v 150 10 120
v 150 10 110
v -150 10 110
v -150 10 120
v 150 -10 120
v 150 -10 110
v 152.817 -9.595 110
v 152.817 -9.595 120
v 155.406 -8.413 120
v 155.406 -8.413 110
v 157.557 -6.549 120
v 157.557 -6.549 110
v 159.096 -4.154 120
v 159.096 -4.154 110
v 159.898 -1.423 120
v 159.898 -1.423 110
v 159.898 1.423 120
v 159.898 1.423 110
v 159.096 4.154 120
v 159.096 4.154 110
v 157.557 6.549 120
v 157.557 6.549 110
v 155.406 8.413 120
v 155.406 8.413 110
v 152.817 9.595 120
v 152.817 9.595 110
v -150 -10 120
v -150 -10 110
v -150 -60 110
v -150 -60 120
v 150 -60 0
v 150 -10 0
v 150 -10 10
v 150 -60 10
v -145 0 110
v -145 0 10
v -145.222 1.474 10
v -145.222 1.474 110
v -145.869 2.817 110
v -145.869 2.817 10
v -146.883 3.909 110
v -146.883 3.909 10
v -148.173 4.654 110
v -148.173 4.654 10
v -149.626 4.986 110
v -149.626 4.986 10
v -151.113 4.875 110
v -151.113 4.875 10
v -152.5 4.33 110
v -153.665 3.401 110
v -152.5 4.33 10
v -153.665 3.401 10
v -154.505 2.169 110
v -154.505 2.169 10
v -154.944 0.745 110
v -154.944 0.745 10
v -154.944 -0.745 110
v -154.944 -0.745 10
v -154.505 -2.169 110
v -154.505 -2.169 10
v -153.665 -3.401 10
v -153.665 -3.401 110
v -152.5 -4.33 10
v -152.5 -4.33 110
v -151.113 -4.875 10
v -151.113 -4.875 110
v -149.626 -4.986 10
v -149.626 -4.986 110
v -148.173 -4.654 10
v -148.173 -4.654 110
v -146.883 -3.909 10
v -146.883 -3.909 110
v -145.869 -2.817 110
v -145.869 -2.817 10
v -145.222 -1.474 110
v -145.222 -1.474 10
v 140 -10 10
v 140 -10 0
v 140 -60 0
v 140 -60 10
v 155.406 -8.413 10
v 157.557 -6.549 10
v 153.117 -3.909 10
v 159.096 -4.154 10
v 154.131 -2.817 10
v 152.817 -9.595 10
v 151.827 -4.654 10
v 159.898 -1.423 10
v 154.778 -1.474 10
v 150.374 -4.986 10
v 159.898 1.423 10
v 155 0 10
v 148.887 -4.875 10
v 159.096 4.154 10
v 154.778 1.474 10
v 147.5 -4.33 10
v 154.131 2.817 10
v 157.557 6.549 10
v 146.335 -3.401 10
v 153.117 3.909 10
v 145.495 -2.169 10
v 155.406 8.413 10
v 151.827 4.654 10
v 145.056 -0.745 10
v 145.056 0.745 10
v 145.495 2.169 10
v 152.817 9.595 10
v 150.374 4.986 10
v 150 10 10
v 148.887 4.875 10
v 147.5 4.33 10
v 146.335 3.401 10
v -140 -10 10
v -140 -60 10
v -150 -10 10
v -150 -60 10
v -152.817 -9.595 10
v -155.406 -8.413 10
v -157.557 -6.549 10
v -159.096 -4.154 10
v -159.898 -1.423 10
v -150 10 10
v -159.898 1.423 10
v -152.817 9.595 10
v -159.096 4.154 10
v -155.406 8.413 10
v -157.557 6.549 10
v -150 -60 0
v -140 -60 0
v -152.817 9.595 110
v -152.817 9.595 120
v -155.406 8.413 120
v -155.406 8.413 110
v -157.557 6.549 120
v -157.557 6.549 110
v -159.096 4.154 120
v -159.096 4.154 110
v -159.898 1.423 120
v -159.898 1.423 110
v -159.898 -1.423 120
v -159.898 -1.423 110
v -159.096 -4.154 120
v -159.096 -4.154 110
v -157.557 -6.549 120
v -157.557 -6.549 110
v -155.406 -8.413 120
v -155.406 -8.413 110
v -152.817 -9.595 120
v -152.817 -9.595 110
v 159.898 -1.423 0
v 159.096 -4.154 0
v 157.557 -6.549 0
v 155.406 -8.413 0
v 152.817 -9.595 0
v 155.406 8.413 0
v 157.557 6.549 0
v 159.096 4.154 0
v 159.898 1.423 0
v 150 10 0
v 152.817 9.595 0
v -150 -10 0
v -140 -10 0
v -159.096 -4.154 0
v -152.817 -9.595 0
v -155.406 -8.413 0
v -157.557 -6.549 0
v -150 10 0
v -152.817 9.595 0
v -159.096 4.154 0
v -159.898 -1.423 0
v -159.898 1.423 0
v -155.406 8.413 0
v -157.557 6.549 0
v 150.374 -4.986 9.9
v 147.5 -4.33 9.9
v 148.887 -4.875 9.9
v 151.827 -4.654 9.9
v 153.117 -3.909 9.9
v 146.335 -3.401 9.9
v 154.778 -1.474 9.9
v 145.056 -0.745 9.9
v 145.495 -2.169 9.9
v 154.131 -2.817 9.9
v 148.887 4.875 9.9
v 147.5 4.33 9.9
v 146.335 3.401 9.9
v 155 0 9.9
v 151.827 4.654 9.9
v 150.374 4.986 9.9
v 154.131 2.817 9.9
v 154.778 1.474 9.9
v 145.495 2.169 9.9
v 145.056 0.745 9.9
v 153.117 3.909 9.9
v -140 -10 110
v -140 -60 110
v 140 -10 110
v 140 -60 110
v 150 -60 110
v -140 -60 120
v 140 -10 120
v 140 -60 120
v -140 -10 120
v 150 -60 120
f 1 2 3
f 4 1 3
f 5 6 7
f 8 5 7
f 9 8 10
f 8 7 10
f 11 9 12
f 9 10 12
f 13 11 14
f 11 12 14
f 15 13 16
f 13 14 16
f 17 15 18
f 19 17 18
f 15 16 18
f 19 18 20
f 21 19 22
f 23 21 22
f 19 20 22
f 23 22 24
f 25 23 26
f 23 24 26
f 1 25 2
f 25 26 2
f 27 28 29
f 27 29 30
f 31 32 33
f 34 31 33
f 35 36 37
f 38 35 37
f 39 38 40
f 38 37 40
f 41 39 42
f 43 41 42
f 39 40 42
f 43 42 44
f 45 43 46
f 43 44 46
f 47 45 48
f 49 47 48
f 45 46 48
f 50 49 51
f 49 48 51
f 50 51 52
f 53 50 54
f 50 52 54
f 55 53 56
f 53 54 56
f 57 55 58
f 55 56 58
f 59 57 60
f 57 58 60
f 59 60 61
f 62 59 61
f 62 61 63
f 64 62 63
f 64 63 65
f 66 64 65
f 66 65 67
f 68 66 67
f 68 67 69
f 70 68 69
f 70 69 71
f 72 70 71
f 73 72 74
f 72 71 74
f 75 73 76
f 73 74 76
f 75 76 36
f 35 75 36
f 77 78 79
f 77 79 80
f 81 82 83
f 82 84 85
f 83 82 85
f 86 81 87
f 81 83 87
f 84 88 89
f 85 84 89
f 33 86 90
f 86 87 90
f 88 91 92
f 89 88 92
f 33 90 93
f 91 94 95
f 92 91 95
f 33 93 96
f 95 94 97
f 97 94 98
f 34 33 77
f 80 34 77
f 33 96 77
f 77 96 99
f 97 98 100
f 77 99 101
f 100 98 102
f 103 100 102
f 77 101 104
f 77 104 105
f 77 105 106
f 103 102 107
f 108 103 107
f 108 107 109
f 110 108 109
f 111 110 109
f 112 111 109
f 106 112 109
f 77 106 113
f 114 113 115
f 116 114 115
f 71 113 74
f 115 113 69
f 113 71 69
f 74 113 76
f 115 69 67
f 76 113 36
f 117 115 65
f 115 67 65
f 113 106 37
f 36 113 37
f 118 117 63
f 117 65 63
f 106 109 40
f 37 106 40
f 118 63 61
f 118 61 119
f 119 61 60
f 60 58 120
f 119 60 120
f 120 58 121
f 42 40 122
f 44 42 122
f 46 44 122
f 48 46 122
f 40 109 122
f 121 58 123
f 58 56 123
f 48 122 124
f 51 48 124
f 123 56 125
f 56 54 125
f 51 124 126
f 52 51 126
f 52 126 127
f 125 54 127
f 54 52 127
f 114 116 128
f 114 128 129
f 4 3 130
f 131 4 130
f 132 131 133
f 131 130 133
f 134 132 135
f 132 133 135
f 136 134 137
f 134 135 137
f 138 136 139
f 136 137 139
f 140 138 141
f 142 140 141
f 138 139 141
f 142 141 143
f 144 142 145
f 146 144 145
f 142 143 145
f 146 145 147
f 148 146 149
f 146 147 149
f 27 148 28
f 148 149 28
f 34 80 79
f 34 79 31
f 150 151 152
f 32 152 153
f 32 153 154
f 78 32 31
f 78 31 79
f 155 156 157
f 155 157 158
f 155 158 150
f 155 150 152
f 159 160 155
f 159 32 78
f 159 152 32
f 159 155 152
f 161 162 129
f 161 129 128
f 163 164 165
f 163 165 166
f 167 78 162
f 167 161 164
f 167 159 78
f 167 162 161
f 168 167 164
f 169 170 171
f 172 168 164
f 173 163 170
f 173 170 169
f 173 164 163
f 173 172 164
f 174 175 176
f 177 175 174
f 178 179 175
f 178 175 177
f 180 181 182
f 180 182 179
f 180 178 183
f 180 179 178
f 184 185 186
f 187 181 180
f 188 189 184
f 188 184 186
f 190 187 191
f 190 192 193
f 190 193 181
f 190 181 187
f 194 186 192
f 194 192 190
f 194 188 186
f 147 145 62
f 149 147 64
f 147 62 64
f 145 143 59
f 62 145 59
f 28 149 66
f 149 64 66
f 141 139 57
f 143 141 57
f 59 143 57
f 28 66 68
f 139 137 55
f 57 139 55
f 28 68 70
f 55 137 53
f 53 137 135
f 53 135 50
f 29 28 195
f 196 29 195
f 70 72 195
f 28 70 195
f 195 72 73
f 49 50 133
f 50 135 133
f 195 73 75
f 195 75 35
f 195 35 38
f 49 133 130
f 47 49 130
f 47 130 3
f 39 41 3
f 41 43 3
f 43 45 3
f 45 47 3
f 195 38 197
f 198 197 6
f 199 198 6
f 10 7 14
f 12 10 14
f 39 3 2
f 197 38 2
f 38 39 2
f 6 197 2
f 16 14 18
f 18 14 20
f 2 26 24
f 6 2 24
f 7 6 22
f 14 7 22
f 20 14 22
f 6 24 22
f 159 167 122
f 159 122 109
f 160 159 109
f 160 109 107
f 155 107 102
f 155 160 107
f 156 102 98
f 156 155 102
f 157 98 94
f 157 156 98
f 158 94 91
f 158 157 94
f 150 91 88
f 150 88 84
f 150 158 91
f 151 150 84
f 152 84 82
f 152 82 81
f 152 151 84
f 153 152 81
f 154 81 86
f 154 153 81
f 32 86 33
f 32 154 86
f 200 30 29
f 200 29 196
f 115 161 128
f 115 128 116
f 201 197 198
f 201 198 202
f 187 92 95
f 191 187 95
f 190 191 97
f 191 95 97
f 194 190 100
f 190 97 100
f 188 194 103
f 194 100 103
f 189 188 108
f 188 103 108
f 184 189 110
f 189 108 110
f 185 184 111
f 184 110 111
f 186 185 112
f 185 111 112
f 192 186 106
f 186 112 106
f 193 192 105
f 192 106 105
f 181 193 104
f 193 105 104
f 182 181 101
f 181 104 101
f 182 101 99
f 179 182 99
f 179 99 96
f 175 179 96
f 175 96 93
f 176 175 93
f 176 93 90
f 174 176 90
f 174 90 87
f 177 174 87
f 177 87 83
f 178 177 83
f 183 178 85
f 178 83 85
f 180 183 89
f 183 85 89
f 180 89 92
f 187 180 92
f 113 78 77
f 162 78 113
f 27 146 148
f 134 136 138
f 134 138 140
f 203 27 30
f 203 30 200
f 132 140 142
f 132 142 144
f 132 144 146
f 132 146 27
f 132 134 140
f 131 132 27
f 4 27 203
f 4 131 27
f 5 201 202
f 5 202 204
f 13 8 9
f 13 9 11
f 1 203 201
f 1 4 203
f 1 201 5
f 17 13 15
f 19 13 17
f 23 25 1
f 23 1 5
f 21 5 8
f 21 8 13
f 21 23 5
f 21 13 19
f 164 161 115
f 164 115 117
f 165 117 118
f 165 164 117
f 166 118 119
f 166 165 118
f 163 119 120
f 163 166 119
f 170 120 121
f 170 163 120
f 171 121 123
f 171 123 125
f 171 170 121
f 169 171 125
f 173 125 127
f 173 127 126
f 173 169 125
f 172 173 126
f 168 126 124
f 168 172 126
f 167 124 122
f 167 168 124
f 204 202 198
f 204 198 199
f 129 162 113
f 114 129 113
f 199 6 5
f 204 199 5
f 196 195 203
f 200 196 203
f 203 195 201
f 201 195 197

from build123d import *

# Parameters (mm, degrees)
SALIENTE_EXTRUIR1_DEPTH = 10
CROQUIS2_R              = 5
SALIENTE_EXTRUIR2_DEPTH = 100
SALIENTE_EXTRUIR3_DEPTH = 10
CROQUIS4_W              = 10
CROQUIS4_H              = 10
SALIENTE_EXTRUIR4_DEPTH = 50
CROQUIS5_R              = 5
CORTAR_EXTRUIR1_DEPTH   = 0.1


with BuildPart() as part:
    # Croquis1 → Saliente-Extruir1 (new body)
    with BuildSketch(Plane.XY):
        with BuildLine():
            Line((-150, 10), (150, 10))
            ThreePointArc((150, 10), (160, 0), (150, -10))
            Line((150, -10), (-150, -10))
            ThreePointArc((-150, -10), (-160, 0), (-150, 10))
        make_face()
    extrude(amount=SALIENTE_EXTRUIR1_DEPTH)

    # Croquis2 → Saliente-Extruir2 (add)
    with BuildSketch(Plane.XY.offset(10)):
        with Locations((-150, 0)):
            Circle(CROQUIS2_R)
    extrude(amount=SALIENTE_EXTRUIR2_DEPTH)

    # Croquis3 → Saliente-Extruir3 (add)
    with BuildSketch(Plane.XY.offset(110)):
        with BuildLine():
            Line((-150, -10), (150, -10))
            ThreePointArc((150, -10), (160, 0), (150, 10))
            Line((150, 10), (-150, 10))
            ThreePointArc((-150, 10), (-160, 0), (-150, -10))
        make_face()
    extrude(amount=SALIENTE_EXTRUIR3_DEPTH)

    # Croquis4 → Saliente-Extruir4 (add)
    with BuildSketch(Plane.XZ.offset(10)):
        with Locations((-145, 115)):
            Rectangle(CROQUIS4_W, CROQUIS4_H)
        with Locations((145, 115)):
            Rectangle(CROQUIS4_W, CROQUIS4_H)
        with Locations((145, 5)):
            Rectangle(CROQUIS4_W, CROQUIS4_H)
        with Locations((-145, 5)):
            Rectangle(CROQUIS4_W, CROQUIS4_H)
    extrude(amount=SALIENTE_EXTRUIR4_DEPTH)

    # Croquis5 → Cortar-Extruir1 (cut)
    with BuildSketch(Plane.XY.offset(10)):
        with Locations((150, 0)):
            Circle(CROQUIS5_R)
    extrude(amount=-CORTAR_EXTRUIR1_DEPTH, mode=Mode.SUBTRACT)


solid = part.part
